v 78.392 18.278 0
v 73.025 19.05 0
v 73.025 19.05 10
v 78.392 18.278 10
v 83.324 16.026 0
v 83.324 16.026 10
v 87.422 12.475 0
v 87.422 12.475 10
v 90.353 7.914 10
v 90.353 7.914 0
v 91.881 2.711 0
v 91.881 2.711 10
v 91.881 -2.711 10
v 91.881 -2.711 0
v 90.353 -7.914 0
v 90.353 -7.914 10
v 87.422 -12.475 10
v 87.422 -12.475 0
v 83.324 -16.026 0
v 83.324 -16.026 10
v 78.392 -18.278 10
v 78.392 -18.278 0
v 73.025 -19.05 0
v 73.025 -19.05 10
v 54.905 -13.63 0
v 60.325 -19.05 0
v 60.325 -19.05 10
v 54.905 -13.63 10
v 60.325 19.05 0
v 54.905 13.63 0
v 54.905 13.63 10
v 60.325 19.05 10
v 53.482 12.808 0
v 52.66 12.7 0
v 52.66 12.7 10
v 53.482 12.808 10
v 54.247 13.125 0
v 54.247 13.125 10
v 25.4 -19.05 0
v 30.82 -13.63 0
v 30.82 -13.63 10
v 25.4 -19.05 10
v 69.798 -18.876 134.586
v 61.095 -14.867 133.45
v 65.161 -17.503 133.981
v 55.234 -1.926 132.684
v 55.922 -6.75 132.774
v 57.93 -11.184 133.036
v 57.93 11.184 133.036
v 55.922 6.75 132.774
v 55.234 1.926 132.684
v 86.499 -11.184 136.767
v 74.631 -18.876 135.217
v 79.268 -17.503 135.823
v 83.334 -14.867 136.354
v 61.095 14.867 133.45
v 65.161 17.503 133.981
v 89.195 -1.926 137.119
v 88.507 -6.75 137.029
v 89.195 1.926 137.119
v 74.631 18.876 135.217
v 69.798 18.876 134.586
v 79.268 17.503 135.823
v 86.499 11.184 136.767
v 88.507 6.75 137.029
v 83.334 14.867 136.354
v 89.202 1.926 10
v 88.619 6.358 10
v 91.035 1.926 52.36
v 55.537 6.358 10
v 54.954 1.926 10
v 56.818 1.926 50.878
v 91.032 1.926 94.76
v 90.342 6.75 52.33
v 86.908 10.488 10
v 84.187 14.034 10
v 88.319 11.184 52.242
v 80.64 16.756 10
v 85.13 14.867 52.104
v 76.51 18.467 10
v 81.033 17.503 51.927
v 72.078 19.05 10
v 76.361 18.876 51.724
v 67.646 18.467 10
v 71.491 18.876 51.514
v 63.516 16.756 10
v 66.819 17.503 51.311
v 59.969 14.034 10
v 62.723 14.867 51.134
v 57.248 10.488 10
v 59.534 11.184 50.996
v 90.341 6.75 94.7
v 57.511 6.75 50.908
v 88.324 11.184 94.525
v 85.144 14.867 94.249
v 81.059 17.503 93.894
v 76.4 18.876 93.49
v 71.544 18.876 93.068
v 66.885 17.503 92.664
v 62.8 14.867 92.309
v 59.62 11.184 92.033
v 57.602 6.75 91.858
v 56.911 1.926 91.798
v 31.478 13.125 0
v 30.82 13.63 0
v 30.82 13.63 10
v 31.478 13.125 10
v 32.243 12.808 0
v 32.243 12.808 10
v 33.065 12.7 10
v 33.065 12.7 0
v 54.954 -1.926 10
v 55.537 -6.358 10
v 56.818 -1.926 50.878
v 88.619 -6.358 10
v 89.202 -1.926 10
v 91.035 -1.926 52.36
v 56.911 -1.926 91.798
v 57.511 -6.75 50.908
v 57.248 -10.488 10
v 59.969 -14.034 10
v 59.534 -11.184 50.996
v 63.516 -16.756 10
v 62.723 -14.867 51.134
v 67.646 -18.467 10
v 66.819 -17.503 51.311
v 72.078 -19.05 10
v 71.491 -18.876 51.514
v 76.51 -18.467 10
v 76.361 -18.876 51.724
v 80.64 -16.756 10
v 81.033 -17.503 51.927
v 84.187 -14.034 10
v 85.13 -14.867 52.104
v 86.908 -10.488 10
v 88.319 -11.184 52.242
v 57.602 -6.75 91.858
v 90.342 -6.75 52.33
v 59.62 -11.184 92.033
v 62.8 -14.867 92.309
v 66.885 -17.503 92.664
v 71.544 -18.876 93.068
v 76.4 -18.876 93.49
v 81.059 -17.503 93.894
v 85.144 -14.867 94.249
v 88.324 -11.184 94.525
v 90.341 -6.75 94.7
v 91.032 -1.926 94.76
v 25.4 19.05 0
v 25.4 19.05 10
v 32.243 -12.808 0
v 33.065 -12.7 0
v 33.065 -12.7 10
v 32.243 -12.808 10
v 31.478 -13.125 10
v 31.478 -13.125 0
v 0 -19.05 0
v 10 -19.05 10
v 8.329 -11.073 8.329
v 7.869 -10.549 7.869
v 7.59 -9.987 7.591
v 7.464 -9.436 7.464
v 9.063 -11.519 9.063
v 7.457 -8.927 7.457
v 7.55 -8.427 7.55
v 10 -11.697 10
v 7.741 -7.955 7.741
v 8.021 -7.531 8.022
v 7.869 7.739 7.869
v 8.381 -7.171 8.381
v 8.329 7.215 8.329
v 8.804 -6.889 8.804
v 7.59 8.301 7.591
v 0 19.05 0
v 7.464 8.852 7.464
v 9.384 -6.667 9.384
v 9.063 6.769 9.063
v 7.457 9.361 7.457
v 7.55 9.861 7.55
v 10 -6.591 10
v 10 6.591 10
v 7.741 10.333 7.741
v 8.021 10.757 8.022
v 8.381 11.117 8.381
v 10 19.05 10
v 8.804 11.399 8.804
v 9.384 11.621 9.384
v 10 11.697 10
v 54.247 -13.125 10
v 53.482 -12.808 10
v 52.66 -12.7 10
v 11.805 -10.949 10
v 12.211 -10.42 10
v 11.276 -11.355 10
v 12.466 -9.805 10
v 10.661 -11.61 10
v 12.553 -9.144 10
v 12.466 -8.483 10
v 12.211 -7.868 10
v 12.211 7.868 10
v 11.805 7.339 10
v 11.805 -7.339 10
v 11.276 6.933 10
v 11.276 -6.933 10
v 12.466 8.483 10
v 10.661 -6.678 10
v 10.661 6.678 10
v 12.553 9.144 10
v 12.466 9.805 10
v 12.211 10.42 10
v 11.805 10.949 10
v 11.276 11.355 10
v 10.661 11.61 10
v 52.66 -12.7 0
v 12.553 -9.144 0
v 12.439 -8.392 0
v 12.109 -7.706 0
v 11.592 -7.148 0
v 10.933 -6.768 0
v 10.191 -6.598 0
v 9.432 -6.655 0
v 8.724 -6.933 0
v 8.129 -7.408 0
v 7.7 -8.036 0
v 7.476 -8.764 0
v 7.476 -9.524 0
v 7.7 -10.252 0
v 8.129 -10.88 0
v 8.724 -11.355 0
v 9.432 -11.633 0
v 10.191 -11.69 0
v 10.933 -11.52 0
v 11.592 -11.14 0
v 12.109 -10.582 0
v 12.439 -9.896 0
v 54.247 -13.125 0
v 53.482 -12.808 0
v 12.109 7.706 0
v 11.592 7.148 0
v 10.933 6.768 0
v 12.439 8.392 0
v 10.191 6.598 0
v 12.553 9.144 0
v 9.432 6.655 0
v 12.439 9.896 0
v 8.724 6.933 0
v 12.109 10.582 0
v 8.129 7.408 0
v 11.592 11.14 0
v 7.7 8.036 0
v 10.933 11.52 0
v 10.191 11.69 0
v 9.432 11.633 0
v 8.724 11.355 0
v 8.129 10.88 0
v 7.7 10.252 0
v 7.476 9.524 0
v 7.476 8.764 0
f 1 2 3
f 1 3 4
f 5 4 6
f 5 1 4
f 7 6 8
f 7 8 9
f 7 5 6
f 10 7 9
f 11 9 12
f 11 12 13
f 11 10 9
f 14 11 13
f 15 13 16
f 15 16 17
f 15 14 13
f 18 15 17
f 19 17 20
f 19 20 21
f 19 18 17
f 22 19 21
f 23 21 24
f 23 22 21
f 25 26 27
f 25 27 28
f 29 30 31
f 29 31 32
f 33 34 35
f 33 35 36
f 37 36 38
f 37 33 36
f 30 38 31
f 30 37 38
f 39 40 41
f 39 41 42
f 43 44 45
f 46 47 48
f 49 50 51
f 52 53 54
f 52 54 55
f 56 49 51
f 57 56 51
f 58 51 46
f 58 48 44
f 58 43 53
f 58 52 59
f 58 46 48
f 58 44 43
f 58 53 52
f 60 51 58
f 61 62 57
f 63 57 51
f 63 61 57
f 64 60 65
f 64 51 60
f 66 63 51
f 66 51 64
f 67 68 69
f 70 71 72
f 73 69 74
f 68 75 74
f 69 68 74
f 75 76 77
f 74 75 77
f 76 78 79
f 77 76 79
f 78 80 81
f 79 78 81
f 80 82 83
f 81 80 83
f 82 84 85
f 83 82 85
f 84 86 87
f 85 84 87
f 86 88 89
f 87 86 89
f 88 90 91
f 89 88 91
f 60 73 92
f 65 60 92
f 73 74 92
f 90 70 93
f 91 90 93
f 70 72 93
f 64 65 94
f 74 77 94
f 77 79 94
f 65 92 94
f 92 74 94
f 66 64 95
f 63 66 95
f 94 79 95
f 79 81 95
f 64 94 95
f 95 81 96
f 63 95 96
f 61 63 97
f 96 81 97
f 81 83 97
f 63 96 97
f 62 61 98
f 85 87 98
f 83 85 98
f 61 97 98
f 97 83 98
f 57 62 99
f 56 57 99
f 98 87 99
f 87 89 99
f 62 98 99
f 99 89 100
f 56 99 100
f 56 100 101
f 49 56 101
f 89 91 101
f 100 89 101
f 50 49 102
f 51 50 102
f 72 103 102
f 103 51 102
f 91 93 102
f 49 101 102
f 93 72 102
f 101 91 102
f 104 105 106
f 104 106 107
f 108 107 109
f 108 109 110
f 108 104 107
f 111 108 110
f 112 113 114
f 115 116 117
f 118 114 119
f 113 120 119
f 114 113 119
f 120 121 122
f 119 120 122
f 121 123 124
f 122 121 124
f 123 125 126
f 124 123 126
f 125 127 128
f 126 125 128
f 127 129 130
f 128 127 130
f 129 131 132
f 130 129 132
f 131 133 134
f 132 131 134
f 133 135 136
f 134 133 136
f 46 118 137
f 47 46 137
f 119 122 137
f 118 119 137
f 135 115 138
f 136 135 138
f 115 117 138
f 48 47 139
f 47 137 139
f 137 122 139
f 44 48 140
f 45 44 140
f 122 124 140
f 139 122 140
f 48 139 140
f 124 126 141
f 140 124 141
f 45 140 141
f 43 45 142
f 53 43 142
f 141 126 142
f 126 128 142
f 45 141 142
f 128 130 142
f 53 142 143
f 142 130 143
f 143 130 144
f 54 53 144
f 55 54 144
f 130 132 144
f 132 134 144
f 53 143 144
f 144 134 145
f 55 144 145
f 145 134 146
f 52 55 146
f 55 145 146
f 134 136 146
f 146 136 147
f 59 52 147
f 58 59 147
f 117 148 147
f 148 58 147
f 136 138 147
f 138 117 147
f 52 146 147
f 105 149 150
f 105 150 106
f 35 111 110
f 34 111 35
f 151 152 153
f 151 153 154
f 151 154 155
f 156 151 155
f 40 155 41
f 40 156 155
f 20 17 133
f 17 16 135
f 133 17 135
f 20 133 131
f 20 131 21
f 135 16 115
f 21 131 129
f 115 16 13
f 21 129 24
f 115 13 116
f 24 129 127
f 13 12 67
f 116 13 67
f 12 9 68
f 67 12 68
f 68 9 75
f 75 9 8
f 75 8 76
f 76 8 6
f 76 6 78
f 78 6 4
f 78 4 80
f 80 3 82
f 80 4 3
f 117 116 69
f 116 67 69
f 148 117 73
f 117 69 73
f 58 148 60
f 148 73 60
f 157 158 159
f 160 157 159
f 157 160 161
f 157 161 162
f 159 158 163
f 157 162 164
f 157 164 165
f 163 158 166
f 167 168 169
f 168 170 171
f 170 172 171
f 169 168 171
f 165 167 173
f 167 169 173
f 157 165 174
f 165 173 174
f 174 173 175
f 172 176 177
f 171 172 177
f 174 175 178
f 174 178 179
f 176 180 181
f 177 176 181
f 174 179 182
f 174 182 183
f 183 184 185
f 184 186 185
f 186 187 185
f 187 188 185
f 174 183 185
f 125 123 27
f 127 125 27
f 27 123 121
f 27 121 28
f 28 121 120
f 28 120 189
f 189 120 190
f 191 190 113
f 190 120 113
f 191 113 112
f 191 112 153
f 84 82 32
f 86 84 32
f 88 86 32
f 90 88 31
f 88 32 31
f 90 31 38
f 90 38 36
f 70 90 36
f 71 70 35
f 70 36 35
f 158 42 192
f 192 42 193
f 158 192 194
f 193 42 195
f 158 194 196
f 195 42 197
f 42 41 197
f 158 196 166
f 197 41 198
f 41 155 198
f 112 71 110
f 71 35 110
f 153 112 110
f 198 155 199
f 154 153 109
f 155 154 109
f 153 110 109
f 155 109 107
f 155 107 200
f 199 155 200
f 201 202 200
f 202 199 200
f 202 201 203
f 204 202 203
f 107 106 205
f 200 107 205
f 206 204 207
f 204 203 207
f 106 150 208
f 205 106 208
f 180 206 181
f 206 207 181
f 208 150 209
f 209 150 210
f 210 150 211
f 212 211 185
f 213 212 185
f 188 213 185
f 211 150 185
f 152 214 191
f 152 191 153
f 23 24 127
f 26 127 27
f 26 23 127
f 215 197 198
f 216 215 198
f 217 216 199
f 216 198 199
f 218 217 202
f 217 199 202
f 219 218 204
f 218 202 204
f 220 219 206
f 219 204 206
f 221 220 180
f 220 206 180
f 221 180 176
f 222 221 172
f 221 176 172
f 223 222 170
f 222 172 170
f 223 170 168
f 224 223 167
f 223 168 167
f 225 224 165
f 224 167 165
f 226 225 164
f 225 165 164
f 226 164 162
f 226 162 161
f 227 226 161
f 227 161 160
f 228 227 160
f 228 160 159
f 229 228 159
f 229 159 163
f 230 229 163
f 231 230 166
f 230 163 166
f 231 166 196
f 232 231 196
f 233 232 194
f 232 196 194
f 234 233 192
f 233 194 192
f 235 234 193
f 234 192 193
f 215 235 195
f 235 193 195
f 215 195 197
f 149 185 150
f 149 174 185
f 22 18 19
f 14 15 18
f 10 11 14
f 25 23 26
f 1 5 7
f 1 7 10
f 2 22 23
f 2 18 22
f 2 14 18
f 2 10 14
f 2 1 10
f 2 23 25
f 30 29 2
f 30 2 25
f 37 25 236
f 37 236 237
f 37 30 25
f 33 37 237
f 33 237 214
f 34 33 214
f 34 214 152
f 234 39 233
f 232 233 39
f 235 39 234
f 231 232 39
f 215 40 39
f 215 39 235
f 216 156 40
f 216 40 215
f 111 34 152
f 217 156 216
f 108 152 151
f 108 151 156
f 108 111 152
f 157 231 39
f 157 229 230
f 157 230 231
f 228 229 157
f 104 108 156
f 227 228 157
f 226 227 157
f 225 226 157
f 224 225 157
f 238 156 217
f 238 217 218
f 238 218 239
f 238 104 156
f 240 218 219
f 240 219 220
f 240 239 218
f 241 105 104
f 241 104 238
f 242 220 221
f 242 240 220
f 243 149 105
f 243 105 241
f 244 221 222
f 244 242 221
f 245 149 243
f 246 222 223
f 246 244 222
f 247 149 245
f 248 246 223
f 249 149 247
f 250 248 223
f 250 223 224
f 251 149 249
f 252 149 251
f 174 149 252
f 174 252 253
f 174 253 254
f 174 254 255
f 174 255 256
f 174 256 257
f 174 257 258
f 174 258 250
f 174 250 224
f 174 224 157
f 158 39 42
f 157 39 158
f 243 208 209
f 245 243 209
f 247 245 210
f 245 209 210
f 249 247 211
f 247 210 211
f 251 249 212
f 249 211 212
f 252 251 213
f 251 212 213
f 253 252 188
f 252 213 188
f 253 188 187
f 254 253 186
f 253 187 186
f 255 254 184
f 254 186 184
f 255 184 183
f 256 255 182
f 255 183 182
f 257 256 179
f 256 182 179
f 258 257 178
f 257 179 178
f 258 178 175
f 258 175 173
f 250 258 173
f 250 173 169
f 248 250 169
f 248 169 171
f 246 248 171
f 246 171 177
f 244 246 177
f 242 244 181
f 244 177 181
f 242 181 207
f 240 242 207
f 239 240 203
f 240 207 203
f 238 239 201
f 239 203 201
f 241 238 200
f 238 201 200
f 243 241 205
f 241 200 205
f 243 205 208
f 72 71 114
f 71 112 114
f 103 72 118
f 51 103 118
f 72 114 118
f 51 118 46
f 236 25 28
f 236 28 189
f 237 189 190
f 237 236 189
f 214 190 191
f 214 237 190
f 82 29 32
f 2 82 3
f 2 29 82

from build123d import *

# Parameters (mm, degrees)
BOSS_EXTRUDE1_DEPTH         = 10
CHAMFER1_SIZE               = 10
F_1_4_20_TAPPED_HOLE1_D     = 5.1054
F_1_4_20_TAPPED_HOLE1_DEPTH = 16.51


with BuildPart() as part:
    # Sketch1 → Boss-Extrude1 (new body)
    with BuildSketch(Plane.XY):
        with BuildLine():
            Line((0, -19.05), (0, 19.05))
            Line((0, 19.05), (25.4, 19.05))
            Line((25.4, 19.05), (30.82006403, 13.62993597))
            ThreePointArc((30.82006403, 13.62993597), (31.850108163, 12.941682484), (33.065128061, 12.7))
            Line((33.065128061, 12.7), (52.659871939, 12.7))
            ThreePointArc((52.659871939, 12.7), (53.874891837, 12.941682484), (54.90493597, 13.62993597))
            Line((54.90493597, 13.62993597), (60.325, 19.05))
            Line((60.325, 19.05), (73.025, 19.05))
            ThreePointArc((73.025, 19.05), (92.075, 0), (73.025, -19.05))
            Line((73.025, -19.05), (60.325, -19.05))
            Line((60.325, -19.05), (54.90493597, -13.62993597))
            ThreePointArc((54.90493597, -13.62993597), (53.874891837, -12.941682484), (52.659871939, -12.7))
            Line((52.659871939, -12.7), (33.065128061, -12.7))
            ThreePointArc((33.065128061, -12.7), (31.850108163, -12.941682484), (30.82006403, -13.62993597))
            Line((30.82006403, -13.62993597), (25.4, -19.05))
            Line((25.4, -19.05), (0, -19.05))
        make_face()
    extrude(amount=BOSS_EXTRUDE1_DEPTH)

    # Chamfer1
    chamfer1_edges = [part.edges().sort_by_distance(p)[0] for p in [
        (0, 0, 10),
    ]]
    chamfer(chamfer1_edges, length=CHAMFER1_SIZE - 0.0001)  # a hair under: the kernel refuses the full size

    # 1/4-20 Tapped Hole1
    with Locations(Plane(origin=(0, 0, 0), x_dir=(-1, 0, 0), z_dir=(0, 0, -1))):
        with Locations((-10, -9.144), (-10, 9.144)):
            Hole(F_1_4_20_TAPPED_HOLE1_D / 2, depth=F_1_4_20_TAPPED_HOLE1_DEPTH)

    # Sweep1: sweep along a path in Sketch8
    with BuildLine(Plane(origin=(0, 0, 0), x_dir=(1, 0, 0), z_dir=(0, 1, 0))) as sweep1_path:
        ThreePointArc((88.281159976, -10), (90.343330416, -73.5), (88.281159976, -137))
    # Sketch5 → Sweep1 (sweep)
    with BuildSketch(Plane.XY.offset(10)):
        with BuildLine():
            Line((89.202450062, -1.925597754), (89.202450062, 1.925597754))
            ThreePointArc((89.202450062, 1.925597754), (72.078047816, 19.05), (54.953645569, 1.925597754))
            Line((54.953645569, 1.925597754), (54.953645569, -1.925597754))
            ThreePointArc((54.953645569, -1.925597754), (72.078047816, -19.05), (89.202450062, -1.925597754))
        make_face()
    sweep(path=sweep1_path.line)


solid = part.part
